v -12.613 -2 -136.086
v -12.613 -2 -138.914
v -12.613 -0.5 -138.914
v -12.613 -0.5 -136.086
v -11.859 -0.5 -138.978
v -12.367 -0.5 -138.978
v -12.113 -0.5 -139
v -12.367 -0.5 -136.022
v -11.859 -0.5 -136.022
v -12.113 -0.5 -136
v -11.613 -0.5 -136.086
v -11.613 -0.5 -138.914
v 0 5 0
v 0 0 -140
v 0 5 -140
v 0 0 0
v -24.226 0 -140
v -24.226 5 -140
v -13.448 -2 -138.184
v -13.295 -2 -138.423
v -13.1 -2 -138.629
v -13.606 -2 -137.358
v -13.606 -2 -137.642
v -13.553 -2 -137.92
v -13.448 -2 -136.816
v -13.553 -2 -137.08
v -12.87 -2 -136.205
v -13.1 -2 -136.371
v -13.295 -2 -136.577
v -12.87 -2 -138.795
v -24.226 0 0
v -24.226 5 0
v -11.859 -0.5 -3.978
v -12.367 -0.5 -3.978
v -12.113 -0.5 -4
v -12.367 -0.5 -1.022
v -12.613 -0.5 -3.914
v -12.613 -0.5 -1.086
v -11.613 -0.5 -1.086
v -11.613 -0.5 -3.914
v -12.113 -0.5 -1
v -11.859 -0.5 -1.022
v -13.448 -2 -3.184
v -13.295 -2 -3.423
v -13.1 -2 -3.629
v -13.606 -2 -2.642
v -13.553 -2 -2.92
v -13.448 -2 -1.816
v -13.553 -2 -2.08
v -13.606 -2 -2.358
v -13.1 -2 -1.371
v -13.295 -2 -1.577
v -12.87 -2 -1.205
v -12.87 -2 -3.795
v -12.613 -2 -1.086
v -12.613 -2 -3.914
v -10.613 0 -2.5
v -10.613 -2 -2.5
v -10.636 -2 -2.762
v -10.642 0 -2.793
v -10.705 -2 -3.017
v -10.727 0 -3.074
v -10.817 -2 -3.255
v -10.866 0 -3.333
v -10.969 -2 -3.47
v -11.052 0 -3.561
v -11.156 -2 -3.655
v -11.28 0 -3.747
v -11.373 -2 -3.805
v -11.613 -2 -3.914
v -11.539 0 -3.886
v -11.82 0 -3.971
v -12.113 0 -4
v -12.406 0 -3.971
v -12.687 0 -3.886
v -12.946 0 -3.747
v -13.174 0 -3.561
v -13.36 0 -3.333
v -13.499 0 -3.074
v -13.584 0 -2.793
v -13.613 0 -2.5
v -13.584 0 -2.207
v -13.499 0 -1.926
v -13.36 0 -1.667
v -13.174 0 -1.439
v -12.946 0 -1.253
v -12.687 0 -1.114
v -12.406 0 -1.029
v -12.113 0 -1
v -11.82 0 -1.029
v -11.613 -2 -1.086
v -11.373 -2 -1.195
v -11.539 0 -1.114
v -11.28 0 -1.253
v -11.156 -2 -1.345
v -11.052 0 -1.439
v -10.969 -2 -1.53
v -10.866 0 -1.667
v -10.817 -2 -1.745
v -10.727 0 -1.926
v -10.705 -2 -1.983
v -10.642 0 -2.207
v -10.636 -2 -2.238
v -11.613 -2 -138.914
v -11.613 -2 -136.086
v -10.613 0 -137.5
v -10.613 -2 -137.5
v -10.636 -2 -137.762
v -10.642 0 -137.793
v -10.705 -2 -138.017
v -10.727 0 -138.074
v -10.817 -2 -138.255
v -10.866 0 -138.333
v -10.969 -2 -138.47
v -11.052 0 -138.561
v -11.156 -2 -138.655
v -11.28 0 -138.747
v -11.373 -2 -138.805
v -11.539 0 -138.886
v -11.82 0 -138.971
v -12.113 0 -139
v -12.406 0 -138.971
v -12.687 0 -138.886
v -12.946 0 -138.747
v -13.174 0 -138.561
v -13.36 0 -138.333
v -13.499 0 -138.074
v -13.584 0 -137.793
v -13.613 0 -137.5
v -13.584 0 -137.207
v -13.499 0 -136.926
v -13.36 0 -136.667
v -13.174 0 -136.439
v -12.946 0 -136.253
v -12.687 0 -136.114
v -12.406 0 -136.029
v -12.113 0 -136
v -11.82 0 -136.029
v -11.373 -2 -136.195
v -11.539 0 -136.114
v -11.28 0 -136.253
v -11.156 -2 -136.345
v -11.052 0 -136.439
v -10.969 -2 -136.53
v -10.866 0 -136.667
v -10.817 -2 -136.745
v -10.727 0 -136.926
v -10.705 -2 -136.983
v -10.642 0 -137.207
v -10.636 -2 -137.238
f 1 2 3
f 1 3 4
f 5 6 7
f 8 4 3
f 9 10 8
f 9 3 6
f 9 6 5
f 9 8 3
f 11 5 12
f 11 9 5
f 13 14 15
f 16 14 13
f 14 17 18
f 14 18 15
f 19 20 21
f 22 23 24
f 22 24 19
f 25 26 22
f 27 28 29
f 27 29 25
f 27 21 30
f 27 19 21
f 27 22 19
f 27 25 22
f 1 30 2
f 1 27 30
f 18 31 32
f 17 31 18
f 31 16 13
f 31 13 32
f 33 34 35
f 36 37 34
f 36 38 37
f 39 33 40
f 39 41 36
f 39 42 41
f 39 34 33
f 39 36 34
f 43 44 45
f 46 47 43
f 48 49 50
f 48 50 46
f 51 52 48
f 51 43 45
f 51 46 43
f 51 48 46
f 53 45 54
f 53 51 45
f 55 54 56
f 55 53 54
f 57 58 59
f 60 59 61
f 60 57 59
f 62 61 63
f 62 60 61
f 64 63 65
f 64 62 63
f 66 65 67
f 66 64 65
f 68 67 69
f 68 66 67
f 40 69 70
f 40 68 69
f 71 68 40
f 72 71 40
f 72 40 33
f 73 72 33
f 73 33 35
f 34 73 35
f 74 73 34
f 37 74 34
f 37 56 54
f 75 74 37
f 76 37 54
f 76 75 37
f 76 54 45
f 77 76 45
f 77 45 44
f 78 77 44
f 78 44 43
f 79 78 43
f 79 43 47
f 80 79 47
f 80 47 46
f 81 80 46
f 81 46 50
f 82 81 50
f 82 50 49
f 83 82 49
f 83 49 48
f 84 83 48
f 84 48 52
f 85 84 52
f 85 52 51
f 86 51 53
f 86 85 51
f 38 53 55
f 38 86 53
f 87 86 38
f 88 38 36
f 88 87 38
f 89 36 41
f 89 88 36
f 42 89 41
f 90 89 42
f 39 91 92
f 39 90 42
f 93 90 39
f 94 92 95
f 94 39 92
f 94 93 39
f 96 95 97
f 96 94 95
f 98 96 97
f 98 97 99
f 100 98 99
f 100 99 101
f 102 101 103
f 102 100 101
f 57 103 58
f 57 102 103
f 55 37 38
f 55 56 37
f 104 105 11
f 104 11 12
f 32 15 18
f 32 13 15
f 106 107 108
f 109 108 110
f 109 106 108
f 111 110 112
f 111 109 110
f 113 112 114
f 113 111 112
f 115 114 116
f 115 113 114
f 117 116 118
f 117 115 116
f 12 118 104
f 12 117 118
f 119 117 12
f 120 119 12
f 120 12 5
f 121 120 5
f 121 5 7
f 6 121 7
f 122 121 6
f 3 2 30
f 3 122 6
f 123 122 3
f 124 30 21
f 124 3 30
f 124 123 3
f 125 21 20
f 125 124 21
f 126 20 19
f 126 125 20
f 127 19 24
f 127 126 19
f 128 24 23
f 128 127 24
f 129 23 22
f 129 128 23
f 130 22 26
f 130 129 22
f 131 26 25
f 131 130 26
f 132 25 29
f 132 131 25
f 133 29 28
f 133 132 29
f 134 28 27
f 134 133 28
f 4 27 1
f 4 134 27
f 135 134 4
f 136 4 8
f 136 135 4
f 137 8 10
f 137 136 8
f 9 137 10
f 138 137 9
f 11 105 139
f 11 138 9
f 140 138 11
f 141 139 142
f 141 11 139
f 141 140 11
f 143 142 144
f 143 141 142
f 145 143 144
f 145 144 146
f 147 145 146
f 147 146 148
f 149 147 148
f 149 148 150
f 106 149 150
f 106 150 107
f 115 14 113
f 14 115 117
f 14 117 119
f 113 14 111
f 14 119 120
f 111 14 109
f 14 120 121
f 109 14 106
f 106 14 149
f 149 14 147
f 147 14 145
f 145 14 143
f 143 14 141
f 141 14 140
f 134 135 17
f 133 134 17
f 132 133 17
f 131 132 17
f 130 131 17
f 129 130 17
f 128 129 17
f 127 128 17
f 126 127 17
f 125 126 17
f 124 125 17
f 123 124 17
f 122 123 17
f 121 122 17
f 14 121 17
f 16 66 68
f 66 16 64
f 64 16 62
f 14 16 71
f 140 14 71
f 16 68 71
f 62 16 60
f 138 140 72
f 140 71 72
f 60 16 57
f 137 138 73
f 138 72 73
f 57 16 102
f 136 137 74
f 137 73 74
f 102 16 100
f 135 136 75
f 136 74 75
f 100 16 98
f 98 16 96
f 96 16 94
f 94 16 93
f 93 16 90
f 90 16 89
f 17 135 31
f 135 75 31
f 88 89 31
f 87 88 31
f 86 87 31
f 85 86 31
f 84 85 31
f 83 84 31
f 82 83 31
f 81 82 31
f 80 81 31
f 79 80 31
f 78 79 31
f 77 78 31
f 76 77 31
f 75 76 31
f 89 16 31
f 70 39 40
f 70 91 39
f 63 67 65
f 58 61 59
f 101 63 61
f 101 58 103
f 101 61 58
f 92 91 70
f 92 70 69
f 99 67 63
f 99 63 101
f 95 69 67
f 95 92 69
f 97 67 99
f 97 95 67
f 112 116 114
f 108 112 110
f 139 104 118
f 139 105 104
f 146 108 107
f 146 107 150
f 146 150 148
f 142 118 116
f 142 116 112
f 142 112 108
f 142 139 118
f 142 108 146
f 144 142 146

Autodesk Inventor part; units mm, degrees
ref_plane "YZ Plane" through (0, 0, 0) normal (1, 0, 0) x (0, 1, 0)
ref_plane "XZ Plane" through (0, 0, 0) normal (0, 1, 0) x (-1, 0, 0)
ref_plane "XY Plane" through (0, 0, 0) normal (0, 0, 1) x (1, 0, 0)
sketch "Sketch1" plane through (0, 0, 0) normal (0, 1, 0) x (-1, 0, 0)
  line L0 (0, 0) -> (24.226, 0)
  line L1 (24.226, 0) -> (24.226, -140)
  line L2 (24.226, -140) -> (0, -140)
  line L3 (0, -140) -> (0, 0)
  dimension "d0" = 24.226
  dimension "d1" = 140
extrude "Extrusion1" add sketch "Sketch1" along normal blind 5
sketch "Sketch2" plane through (0, 5, 0) normal (0, 1, 0) x (1, 0, 0)
  point P0 (0, 0)
sketch "Sketch3" plane through (0, 0, 0) normal (0, -1, 0) x (1, 0, 0)
  circle A0 centre (-12.113, -2.5) radius 1.5
  point P0 (0, 0)
  dimension "d4" = 3
extrude "Extrusion2" add sketch "Sketch3" along normal blind 2
sketch "Sketch4" plane through (0, 0, 0) normal (0, -1, 0) x (1, 0, 0)
  point P0 (0, 0)
sketch "Sketch5" plane through (-12.113, -2, -2.5) normal (0, -1, 0) x (1, 0, 0)
  line L0 (-0.5, 1.5) -> (0.5, 1.5)
  line L1 (0.5, 1.5) -> (0.5, -1.5)
  line L2 (0.5, -1.5) -> (-0.5, -1.5)
  line L3 (-0.5, -1.5) -> (-0.5, 1.5)
  line L4 (-0.5, 1.5) -> (0.5, -1.5) construction
  line L5 (0.5, 1.5) -> (-0.5, -1.5) construction
  point P0 (12.113, 2.5)
  point P1 (0, 0)
  dimension "d7" = 1
extrude "Extrusion3" cut sketch "Sketch5" against normal blind 1.5
pattern_linear "Rectangular Pattern1" count 2 spacing 135 along (0, 0, -1) of "Extrusion2", "Extrusion3"
properties part number "part 2 upper part"
